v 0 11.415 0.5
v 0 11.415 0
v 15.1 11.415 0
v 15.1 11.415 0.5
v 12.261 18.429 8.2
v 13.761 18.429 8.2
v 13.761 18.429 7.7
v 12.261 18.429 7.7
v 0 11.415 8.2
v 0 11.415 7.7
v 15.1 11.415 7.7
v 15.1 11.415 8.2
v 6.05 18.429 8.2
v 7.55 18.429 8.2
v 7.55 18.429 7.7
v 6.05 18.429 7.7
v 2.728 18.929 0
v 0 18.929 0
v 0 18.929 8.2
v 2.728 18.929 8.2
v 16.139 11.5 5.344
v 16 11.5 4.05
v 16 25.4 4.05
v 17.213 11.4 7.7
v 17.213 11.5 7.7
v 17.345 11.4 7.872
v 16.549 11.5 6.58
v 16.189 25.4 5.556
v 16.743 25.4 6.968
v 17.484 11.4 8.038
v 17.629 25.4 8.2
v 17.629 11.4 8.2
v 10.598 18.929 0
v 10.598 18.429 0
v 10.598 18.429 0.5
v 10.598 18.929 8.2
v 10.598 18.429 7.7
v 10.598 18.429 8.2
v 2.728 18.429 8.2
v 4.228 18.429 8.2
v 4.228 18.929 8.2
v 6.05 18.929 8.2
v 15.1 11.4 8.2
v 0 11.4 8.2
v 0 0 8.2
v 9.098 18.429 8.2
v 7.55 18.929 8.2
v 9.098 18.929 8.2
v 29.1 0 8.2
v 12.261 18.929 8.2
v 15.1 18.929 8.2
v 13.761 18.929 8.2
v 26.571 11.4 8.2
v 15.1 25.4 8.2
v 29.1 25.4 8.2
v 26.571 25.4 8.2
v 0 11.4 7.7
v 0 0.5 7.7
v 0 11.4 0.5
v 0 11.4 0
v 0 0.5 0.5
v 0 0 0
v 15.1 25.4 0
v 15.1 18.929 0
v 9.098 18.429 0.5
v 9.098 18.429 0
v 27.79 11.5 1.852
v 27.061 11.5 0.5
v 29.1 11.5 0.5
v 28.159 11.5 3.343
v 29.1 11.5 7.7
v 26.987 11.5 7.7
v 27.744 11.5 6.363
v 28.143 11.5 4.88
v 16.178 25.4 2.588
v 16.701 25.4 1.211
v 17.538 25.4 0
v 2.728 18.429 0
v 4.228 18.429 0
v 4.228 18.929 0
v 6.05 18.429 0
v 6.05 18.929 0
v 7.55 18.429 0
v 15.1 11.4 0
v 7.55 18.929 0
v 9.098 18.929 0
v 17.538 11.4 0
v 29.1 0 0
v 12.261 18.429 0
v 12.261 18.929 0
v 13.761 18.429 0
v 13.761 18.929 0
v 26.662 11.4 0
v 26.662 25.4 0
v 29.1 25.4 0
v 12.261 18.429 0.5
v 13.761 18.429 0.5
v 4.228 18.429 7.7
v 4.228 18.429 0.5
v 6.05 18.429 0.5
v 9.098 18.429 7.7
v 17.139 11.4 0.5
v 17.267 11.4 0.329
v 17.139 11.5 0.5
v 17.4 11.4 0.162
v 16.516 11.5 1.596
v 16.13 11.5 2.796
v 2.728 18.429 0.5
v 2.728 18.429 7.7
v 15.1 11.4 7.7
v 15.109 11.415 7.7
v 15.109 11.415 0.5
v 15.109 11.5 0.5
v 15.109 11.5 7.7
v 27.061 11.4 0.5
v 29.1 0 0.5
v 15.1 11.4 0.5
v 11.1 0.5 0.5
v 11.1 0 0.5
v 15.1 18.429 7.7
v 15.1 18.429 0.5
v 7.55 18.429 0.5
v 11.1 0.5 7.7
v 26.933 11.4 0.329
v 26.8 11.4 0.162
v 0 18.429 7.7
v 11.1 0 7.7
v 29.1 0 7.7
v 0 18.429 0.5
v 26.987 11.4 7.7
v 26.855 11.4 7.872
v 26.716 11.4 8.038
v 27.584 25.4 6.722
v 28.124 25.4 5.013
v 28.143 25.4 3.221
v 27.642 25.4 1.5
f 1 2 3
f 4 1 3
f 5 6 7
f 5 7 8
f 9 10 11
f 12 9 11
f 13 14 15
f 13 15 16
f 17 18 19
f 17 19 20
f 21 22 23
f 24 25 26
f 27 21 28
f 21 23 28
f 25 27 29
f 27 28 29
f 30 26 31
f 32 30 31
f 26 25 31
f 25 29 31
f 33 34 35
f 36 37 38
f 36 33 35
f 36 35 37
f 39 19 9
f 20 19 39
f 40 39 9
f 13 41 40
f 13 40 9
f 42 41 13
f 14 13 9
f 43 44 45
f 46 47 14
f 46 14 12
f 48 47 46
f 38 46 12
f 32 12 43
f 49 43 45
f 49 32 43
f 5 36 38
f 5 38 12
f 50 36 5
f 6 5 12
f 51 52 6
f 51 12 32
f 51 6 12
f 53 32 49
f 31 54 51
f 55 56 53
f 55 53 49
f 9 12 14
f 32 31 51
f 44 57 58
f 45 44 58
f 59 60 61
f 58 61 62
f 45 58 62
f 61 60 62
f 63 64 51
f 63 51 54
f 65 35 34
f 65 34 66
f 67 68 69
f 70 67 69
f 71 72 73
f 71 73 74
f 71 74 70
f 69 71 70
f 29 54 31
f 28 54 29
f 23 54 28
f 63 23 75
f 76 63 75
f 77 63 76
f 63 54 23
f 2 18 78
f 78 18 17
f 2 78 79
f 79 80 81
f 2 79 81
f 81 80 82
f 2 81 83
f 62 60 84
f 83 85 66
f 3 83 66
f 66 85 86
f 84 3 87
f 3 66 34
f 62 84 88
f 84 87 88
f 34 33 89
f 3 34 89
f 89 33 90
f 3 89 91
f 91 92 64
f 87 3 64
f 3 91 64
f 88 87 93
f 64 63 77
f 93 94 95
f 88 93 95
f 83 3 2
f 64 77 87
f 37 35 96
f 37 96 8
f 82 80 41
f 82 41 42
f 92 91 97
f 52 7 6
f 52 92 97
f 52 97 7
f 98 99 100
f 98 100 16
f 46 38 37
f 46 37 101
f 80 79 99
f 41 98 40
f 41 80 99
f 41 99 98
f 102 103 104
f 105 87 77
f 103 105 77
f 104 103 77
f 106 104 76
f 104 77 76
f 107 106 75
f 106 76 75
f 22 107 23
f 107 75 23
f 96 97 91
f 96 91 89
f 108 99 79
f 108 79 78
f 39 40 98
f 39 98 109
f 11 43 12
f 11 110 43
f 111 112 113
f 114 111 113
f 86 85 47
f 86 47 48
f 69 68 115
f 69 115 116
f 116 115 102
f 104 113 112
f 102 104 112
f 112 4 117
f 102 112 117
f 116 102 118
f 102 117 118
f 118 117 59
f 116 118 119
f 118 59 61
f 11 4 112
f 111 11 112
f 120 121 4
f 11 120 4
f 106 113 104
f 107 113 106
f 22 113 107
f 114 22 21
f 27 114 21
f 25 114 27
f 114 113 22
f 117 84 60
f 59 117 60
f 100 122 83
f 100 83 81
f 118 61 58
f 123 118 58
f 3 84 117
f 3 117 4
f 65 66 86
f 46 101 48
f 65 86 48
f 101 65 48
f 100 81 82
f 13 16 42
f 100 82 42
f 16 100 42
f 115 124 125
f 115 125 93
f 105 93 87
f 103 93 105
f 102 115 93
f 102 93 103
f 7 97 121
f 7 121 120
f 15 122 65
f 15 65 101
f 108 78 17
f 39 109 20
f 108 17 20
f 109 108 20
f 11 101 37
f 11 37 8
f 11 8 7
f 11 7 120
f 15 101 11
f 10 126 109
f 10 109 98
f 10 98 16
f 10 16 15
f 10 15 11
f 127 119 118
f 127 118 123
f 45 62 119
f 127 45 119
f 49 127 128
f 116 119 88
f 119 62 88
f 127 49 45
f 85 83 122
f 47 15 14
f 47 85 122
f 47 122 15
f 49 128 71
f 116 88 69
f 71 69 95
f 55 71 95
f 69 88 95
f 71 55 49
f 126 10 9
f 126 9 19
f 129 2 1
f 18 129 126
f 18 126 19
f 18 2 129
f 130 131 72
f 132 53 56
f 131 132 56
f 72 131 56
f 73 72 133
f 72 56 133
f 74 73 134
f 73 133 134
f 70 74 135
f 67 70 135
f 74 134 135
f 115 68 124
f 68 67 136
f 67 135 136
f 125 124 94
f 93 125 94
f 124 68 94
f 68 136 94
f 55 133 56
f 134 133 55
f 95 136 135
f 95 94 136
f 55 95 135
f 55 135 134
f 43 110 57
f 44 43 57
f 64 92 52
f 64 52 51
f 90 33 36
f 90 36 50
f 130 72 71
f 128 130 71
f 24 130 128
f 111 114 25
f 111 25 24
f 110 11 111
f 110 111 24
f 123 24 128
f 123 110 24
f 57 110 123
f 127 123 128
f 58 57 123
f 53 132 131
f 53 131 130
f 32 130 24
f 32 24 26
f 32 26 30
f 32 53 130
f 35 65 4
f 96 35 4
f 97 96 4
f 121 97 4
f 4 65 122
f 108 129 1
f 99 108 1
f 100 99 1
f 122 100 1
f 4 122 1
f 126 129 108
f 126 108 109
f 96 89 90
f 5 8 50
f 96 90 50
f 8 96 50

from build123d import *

# Parameters (mm, degrees)
F0_W      = 14
F0_H      = 14
F1_DEPTH  = 8.2
F2_W      = 18
F2_H      = 7.2
F3_DEPTH  = 11.5
F5_DEPTH  = 14
F6_W      = 10.9
F6_H      = 7.2
F7_DEPTH  = 25
F8_W      = 15.1089467108
F8_H      = 7.5144236907
F9_DEPTH  = 8.2
F10_W     = 7.0144236907
F10_H     = 7.2
F11_DEPTH = 15.1
F12_W     = 1.5
F12_H     = 8.2
F13_DEPTH = 0.5


with BuildPart() as f1:
    # F0 (on Top) → F1 (new body)
    with BuildSketch(Plane.XY):
        Polygon((0, 11.4), (0, 0), (29.1, 0), (29.1, 11.4), (15.1, 11.4), align=None)
        with Locations((22.1, 18.4)):
            Rectangle(F0_W, F0_H)
    extrude(amount=F1_DEPTH)

    # F2 (on face) → F3 (cut)
    with BuildSketch(Plane.XZ):
        with Locations((20.1, 4.1)):
            Rectangle(F2_W, F2_H)
    extrude(amount=-F3_DEPTH, mode=Mode.SUBTRACT)

    # F4 (on face) → F5 (cut)
    with BuildSketch(Plane(origin=(0, 25.4, 0), x_dir=(-1, 0, 0), z_dir=(0, 1, 0))):
        with BuildLine():
            ThreePointArc((-17.5384761318, 0), (-16.3975752703, 1.8838162123), (-16, 4.05))
            ThreePointArc((-16, 4.05), (-16.4219059983, 6.2791811295), (-17.6292618059, 8.2))
            Line((-17.6292618059, 8.2), (-26.5707381941, 8.2))
            ThreePointArc((-26.5707381941, 8.2), (-28.1996261763, 4.1175315456), (-26.6615238682, 0))
            Line((-26.6615238682, 0), (-17.5384761318, 0))
        make_face()
    extrude(amount=-F5_DEPTH, mode=Mode.SUBTRACT)

    # F6 (on face) → F7 (cut)
    with BuildSketch(Plane(origin=(0, 0, 0), x_dir=(0, -1, 0), z_dir=(-1, 0, 0))):
        with Locations((-5.95, 4.1)):
            Rectangle(F6_W, F6_H)
    extrude(amount=-F7_DEPTH, mode=Mode.SUBTRACT)

    # F8 (on Top) → F9 (join)
    with BuildSketch(Plane.XY):
        with Locations((7.5544733554, 15.1720256545)):
            Rectangle(F8_W, F8_H)
    extrude(amount=F9_DEPTH)

    # F10 (on face) → F11 (cut)
    with BuildSketch(Plane(origin=(0, 0, 0), x_dir=(0, -1, 0), z_dir=(-1, 0, 0))):
        with Locations((-14.9220256545, 4.1)):
            Rectangle(F10_W, F10_H)
    extrude(amount=-F11_DEPTH, mode=Mode.SUBTRACT)

    # F12 (on face) → F13 (cut)
    with BuildSketch(Plane(origin=(0, 18.9292374998, 0), x_dir=(-1, 0, 0), z_dir=(0, 1, 0))):
        with Locations((-13.0113965198, 4.1)):
            Rectangle(F12_W, F12_H)
        with Locations((-6.8, 4.1)):
            Rectangle(F12_W, F12_H)
        with Locations((-9.8479721993, 4.1)):
            Rectangle(F12_W, F12_H)
        with Locations((-3.4783656076, 4.1)):
            Rectangle(F12_W, F12_H)
    extrude(amount=-F13_DEPTH, mode=Mode.SUBTRACT)


solid = f1.part
